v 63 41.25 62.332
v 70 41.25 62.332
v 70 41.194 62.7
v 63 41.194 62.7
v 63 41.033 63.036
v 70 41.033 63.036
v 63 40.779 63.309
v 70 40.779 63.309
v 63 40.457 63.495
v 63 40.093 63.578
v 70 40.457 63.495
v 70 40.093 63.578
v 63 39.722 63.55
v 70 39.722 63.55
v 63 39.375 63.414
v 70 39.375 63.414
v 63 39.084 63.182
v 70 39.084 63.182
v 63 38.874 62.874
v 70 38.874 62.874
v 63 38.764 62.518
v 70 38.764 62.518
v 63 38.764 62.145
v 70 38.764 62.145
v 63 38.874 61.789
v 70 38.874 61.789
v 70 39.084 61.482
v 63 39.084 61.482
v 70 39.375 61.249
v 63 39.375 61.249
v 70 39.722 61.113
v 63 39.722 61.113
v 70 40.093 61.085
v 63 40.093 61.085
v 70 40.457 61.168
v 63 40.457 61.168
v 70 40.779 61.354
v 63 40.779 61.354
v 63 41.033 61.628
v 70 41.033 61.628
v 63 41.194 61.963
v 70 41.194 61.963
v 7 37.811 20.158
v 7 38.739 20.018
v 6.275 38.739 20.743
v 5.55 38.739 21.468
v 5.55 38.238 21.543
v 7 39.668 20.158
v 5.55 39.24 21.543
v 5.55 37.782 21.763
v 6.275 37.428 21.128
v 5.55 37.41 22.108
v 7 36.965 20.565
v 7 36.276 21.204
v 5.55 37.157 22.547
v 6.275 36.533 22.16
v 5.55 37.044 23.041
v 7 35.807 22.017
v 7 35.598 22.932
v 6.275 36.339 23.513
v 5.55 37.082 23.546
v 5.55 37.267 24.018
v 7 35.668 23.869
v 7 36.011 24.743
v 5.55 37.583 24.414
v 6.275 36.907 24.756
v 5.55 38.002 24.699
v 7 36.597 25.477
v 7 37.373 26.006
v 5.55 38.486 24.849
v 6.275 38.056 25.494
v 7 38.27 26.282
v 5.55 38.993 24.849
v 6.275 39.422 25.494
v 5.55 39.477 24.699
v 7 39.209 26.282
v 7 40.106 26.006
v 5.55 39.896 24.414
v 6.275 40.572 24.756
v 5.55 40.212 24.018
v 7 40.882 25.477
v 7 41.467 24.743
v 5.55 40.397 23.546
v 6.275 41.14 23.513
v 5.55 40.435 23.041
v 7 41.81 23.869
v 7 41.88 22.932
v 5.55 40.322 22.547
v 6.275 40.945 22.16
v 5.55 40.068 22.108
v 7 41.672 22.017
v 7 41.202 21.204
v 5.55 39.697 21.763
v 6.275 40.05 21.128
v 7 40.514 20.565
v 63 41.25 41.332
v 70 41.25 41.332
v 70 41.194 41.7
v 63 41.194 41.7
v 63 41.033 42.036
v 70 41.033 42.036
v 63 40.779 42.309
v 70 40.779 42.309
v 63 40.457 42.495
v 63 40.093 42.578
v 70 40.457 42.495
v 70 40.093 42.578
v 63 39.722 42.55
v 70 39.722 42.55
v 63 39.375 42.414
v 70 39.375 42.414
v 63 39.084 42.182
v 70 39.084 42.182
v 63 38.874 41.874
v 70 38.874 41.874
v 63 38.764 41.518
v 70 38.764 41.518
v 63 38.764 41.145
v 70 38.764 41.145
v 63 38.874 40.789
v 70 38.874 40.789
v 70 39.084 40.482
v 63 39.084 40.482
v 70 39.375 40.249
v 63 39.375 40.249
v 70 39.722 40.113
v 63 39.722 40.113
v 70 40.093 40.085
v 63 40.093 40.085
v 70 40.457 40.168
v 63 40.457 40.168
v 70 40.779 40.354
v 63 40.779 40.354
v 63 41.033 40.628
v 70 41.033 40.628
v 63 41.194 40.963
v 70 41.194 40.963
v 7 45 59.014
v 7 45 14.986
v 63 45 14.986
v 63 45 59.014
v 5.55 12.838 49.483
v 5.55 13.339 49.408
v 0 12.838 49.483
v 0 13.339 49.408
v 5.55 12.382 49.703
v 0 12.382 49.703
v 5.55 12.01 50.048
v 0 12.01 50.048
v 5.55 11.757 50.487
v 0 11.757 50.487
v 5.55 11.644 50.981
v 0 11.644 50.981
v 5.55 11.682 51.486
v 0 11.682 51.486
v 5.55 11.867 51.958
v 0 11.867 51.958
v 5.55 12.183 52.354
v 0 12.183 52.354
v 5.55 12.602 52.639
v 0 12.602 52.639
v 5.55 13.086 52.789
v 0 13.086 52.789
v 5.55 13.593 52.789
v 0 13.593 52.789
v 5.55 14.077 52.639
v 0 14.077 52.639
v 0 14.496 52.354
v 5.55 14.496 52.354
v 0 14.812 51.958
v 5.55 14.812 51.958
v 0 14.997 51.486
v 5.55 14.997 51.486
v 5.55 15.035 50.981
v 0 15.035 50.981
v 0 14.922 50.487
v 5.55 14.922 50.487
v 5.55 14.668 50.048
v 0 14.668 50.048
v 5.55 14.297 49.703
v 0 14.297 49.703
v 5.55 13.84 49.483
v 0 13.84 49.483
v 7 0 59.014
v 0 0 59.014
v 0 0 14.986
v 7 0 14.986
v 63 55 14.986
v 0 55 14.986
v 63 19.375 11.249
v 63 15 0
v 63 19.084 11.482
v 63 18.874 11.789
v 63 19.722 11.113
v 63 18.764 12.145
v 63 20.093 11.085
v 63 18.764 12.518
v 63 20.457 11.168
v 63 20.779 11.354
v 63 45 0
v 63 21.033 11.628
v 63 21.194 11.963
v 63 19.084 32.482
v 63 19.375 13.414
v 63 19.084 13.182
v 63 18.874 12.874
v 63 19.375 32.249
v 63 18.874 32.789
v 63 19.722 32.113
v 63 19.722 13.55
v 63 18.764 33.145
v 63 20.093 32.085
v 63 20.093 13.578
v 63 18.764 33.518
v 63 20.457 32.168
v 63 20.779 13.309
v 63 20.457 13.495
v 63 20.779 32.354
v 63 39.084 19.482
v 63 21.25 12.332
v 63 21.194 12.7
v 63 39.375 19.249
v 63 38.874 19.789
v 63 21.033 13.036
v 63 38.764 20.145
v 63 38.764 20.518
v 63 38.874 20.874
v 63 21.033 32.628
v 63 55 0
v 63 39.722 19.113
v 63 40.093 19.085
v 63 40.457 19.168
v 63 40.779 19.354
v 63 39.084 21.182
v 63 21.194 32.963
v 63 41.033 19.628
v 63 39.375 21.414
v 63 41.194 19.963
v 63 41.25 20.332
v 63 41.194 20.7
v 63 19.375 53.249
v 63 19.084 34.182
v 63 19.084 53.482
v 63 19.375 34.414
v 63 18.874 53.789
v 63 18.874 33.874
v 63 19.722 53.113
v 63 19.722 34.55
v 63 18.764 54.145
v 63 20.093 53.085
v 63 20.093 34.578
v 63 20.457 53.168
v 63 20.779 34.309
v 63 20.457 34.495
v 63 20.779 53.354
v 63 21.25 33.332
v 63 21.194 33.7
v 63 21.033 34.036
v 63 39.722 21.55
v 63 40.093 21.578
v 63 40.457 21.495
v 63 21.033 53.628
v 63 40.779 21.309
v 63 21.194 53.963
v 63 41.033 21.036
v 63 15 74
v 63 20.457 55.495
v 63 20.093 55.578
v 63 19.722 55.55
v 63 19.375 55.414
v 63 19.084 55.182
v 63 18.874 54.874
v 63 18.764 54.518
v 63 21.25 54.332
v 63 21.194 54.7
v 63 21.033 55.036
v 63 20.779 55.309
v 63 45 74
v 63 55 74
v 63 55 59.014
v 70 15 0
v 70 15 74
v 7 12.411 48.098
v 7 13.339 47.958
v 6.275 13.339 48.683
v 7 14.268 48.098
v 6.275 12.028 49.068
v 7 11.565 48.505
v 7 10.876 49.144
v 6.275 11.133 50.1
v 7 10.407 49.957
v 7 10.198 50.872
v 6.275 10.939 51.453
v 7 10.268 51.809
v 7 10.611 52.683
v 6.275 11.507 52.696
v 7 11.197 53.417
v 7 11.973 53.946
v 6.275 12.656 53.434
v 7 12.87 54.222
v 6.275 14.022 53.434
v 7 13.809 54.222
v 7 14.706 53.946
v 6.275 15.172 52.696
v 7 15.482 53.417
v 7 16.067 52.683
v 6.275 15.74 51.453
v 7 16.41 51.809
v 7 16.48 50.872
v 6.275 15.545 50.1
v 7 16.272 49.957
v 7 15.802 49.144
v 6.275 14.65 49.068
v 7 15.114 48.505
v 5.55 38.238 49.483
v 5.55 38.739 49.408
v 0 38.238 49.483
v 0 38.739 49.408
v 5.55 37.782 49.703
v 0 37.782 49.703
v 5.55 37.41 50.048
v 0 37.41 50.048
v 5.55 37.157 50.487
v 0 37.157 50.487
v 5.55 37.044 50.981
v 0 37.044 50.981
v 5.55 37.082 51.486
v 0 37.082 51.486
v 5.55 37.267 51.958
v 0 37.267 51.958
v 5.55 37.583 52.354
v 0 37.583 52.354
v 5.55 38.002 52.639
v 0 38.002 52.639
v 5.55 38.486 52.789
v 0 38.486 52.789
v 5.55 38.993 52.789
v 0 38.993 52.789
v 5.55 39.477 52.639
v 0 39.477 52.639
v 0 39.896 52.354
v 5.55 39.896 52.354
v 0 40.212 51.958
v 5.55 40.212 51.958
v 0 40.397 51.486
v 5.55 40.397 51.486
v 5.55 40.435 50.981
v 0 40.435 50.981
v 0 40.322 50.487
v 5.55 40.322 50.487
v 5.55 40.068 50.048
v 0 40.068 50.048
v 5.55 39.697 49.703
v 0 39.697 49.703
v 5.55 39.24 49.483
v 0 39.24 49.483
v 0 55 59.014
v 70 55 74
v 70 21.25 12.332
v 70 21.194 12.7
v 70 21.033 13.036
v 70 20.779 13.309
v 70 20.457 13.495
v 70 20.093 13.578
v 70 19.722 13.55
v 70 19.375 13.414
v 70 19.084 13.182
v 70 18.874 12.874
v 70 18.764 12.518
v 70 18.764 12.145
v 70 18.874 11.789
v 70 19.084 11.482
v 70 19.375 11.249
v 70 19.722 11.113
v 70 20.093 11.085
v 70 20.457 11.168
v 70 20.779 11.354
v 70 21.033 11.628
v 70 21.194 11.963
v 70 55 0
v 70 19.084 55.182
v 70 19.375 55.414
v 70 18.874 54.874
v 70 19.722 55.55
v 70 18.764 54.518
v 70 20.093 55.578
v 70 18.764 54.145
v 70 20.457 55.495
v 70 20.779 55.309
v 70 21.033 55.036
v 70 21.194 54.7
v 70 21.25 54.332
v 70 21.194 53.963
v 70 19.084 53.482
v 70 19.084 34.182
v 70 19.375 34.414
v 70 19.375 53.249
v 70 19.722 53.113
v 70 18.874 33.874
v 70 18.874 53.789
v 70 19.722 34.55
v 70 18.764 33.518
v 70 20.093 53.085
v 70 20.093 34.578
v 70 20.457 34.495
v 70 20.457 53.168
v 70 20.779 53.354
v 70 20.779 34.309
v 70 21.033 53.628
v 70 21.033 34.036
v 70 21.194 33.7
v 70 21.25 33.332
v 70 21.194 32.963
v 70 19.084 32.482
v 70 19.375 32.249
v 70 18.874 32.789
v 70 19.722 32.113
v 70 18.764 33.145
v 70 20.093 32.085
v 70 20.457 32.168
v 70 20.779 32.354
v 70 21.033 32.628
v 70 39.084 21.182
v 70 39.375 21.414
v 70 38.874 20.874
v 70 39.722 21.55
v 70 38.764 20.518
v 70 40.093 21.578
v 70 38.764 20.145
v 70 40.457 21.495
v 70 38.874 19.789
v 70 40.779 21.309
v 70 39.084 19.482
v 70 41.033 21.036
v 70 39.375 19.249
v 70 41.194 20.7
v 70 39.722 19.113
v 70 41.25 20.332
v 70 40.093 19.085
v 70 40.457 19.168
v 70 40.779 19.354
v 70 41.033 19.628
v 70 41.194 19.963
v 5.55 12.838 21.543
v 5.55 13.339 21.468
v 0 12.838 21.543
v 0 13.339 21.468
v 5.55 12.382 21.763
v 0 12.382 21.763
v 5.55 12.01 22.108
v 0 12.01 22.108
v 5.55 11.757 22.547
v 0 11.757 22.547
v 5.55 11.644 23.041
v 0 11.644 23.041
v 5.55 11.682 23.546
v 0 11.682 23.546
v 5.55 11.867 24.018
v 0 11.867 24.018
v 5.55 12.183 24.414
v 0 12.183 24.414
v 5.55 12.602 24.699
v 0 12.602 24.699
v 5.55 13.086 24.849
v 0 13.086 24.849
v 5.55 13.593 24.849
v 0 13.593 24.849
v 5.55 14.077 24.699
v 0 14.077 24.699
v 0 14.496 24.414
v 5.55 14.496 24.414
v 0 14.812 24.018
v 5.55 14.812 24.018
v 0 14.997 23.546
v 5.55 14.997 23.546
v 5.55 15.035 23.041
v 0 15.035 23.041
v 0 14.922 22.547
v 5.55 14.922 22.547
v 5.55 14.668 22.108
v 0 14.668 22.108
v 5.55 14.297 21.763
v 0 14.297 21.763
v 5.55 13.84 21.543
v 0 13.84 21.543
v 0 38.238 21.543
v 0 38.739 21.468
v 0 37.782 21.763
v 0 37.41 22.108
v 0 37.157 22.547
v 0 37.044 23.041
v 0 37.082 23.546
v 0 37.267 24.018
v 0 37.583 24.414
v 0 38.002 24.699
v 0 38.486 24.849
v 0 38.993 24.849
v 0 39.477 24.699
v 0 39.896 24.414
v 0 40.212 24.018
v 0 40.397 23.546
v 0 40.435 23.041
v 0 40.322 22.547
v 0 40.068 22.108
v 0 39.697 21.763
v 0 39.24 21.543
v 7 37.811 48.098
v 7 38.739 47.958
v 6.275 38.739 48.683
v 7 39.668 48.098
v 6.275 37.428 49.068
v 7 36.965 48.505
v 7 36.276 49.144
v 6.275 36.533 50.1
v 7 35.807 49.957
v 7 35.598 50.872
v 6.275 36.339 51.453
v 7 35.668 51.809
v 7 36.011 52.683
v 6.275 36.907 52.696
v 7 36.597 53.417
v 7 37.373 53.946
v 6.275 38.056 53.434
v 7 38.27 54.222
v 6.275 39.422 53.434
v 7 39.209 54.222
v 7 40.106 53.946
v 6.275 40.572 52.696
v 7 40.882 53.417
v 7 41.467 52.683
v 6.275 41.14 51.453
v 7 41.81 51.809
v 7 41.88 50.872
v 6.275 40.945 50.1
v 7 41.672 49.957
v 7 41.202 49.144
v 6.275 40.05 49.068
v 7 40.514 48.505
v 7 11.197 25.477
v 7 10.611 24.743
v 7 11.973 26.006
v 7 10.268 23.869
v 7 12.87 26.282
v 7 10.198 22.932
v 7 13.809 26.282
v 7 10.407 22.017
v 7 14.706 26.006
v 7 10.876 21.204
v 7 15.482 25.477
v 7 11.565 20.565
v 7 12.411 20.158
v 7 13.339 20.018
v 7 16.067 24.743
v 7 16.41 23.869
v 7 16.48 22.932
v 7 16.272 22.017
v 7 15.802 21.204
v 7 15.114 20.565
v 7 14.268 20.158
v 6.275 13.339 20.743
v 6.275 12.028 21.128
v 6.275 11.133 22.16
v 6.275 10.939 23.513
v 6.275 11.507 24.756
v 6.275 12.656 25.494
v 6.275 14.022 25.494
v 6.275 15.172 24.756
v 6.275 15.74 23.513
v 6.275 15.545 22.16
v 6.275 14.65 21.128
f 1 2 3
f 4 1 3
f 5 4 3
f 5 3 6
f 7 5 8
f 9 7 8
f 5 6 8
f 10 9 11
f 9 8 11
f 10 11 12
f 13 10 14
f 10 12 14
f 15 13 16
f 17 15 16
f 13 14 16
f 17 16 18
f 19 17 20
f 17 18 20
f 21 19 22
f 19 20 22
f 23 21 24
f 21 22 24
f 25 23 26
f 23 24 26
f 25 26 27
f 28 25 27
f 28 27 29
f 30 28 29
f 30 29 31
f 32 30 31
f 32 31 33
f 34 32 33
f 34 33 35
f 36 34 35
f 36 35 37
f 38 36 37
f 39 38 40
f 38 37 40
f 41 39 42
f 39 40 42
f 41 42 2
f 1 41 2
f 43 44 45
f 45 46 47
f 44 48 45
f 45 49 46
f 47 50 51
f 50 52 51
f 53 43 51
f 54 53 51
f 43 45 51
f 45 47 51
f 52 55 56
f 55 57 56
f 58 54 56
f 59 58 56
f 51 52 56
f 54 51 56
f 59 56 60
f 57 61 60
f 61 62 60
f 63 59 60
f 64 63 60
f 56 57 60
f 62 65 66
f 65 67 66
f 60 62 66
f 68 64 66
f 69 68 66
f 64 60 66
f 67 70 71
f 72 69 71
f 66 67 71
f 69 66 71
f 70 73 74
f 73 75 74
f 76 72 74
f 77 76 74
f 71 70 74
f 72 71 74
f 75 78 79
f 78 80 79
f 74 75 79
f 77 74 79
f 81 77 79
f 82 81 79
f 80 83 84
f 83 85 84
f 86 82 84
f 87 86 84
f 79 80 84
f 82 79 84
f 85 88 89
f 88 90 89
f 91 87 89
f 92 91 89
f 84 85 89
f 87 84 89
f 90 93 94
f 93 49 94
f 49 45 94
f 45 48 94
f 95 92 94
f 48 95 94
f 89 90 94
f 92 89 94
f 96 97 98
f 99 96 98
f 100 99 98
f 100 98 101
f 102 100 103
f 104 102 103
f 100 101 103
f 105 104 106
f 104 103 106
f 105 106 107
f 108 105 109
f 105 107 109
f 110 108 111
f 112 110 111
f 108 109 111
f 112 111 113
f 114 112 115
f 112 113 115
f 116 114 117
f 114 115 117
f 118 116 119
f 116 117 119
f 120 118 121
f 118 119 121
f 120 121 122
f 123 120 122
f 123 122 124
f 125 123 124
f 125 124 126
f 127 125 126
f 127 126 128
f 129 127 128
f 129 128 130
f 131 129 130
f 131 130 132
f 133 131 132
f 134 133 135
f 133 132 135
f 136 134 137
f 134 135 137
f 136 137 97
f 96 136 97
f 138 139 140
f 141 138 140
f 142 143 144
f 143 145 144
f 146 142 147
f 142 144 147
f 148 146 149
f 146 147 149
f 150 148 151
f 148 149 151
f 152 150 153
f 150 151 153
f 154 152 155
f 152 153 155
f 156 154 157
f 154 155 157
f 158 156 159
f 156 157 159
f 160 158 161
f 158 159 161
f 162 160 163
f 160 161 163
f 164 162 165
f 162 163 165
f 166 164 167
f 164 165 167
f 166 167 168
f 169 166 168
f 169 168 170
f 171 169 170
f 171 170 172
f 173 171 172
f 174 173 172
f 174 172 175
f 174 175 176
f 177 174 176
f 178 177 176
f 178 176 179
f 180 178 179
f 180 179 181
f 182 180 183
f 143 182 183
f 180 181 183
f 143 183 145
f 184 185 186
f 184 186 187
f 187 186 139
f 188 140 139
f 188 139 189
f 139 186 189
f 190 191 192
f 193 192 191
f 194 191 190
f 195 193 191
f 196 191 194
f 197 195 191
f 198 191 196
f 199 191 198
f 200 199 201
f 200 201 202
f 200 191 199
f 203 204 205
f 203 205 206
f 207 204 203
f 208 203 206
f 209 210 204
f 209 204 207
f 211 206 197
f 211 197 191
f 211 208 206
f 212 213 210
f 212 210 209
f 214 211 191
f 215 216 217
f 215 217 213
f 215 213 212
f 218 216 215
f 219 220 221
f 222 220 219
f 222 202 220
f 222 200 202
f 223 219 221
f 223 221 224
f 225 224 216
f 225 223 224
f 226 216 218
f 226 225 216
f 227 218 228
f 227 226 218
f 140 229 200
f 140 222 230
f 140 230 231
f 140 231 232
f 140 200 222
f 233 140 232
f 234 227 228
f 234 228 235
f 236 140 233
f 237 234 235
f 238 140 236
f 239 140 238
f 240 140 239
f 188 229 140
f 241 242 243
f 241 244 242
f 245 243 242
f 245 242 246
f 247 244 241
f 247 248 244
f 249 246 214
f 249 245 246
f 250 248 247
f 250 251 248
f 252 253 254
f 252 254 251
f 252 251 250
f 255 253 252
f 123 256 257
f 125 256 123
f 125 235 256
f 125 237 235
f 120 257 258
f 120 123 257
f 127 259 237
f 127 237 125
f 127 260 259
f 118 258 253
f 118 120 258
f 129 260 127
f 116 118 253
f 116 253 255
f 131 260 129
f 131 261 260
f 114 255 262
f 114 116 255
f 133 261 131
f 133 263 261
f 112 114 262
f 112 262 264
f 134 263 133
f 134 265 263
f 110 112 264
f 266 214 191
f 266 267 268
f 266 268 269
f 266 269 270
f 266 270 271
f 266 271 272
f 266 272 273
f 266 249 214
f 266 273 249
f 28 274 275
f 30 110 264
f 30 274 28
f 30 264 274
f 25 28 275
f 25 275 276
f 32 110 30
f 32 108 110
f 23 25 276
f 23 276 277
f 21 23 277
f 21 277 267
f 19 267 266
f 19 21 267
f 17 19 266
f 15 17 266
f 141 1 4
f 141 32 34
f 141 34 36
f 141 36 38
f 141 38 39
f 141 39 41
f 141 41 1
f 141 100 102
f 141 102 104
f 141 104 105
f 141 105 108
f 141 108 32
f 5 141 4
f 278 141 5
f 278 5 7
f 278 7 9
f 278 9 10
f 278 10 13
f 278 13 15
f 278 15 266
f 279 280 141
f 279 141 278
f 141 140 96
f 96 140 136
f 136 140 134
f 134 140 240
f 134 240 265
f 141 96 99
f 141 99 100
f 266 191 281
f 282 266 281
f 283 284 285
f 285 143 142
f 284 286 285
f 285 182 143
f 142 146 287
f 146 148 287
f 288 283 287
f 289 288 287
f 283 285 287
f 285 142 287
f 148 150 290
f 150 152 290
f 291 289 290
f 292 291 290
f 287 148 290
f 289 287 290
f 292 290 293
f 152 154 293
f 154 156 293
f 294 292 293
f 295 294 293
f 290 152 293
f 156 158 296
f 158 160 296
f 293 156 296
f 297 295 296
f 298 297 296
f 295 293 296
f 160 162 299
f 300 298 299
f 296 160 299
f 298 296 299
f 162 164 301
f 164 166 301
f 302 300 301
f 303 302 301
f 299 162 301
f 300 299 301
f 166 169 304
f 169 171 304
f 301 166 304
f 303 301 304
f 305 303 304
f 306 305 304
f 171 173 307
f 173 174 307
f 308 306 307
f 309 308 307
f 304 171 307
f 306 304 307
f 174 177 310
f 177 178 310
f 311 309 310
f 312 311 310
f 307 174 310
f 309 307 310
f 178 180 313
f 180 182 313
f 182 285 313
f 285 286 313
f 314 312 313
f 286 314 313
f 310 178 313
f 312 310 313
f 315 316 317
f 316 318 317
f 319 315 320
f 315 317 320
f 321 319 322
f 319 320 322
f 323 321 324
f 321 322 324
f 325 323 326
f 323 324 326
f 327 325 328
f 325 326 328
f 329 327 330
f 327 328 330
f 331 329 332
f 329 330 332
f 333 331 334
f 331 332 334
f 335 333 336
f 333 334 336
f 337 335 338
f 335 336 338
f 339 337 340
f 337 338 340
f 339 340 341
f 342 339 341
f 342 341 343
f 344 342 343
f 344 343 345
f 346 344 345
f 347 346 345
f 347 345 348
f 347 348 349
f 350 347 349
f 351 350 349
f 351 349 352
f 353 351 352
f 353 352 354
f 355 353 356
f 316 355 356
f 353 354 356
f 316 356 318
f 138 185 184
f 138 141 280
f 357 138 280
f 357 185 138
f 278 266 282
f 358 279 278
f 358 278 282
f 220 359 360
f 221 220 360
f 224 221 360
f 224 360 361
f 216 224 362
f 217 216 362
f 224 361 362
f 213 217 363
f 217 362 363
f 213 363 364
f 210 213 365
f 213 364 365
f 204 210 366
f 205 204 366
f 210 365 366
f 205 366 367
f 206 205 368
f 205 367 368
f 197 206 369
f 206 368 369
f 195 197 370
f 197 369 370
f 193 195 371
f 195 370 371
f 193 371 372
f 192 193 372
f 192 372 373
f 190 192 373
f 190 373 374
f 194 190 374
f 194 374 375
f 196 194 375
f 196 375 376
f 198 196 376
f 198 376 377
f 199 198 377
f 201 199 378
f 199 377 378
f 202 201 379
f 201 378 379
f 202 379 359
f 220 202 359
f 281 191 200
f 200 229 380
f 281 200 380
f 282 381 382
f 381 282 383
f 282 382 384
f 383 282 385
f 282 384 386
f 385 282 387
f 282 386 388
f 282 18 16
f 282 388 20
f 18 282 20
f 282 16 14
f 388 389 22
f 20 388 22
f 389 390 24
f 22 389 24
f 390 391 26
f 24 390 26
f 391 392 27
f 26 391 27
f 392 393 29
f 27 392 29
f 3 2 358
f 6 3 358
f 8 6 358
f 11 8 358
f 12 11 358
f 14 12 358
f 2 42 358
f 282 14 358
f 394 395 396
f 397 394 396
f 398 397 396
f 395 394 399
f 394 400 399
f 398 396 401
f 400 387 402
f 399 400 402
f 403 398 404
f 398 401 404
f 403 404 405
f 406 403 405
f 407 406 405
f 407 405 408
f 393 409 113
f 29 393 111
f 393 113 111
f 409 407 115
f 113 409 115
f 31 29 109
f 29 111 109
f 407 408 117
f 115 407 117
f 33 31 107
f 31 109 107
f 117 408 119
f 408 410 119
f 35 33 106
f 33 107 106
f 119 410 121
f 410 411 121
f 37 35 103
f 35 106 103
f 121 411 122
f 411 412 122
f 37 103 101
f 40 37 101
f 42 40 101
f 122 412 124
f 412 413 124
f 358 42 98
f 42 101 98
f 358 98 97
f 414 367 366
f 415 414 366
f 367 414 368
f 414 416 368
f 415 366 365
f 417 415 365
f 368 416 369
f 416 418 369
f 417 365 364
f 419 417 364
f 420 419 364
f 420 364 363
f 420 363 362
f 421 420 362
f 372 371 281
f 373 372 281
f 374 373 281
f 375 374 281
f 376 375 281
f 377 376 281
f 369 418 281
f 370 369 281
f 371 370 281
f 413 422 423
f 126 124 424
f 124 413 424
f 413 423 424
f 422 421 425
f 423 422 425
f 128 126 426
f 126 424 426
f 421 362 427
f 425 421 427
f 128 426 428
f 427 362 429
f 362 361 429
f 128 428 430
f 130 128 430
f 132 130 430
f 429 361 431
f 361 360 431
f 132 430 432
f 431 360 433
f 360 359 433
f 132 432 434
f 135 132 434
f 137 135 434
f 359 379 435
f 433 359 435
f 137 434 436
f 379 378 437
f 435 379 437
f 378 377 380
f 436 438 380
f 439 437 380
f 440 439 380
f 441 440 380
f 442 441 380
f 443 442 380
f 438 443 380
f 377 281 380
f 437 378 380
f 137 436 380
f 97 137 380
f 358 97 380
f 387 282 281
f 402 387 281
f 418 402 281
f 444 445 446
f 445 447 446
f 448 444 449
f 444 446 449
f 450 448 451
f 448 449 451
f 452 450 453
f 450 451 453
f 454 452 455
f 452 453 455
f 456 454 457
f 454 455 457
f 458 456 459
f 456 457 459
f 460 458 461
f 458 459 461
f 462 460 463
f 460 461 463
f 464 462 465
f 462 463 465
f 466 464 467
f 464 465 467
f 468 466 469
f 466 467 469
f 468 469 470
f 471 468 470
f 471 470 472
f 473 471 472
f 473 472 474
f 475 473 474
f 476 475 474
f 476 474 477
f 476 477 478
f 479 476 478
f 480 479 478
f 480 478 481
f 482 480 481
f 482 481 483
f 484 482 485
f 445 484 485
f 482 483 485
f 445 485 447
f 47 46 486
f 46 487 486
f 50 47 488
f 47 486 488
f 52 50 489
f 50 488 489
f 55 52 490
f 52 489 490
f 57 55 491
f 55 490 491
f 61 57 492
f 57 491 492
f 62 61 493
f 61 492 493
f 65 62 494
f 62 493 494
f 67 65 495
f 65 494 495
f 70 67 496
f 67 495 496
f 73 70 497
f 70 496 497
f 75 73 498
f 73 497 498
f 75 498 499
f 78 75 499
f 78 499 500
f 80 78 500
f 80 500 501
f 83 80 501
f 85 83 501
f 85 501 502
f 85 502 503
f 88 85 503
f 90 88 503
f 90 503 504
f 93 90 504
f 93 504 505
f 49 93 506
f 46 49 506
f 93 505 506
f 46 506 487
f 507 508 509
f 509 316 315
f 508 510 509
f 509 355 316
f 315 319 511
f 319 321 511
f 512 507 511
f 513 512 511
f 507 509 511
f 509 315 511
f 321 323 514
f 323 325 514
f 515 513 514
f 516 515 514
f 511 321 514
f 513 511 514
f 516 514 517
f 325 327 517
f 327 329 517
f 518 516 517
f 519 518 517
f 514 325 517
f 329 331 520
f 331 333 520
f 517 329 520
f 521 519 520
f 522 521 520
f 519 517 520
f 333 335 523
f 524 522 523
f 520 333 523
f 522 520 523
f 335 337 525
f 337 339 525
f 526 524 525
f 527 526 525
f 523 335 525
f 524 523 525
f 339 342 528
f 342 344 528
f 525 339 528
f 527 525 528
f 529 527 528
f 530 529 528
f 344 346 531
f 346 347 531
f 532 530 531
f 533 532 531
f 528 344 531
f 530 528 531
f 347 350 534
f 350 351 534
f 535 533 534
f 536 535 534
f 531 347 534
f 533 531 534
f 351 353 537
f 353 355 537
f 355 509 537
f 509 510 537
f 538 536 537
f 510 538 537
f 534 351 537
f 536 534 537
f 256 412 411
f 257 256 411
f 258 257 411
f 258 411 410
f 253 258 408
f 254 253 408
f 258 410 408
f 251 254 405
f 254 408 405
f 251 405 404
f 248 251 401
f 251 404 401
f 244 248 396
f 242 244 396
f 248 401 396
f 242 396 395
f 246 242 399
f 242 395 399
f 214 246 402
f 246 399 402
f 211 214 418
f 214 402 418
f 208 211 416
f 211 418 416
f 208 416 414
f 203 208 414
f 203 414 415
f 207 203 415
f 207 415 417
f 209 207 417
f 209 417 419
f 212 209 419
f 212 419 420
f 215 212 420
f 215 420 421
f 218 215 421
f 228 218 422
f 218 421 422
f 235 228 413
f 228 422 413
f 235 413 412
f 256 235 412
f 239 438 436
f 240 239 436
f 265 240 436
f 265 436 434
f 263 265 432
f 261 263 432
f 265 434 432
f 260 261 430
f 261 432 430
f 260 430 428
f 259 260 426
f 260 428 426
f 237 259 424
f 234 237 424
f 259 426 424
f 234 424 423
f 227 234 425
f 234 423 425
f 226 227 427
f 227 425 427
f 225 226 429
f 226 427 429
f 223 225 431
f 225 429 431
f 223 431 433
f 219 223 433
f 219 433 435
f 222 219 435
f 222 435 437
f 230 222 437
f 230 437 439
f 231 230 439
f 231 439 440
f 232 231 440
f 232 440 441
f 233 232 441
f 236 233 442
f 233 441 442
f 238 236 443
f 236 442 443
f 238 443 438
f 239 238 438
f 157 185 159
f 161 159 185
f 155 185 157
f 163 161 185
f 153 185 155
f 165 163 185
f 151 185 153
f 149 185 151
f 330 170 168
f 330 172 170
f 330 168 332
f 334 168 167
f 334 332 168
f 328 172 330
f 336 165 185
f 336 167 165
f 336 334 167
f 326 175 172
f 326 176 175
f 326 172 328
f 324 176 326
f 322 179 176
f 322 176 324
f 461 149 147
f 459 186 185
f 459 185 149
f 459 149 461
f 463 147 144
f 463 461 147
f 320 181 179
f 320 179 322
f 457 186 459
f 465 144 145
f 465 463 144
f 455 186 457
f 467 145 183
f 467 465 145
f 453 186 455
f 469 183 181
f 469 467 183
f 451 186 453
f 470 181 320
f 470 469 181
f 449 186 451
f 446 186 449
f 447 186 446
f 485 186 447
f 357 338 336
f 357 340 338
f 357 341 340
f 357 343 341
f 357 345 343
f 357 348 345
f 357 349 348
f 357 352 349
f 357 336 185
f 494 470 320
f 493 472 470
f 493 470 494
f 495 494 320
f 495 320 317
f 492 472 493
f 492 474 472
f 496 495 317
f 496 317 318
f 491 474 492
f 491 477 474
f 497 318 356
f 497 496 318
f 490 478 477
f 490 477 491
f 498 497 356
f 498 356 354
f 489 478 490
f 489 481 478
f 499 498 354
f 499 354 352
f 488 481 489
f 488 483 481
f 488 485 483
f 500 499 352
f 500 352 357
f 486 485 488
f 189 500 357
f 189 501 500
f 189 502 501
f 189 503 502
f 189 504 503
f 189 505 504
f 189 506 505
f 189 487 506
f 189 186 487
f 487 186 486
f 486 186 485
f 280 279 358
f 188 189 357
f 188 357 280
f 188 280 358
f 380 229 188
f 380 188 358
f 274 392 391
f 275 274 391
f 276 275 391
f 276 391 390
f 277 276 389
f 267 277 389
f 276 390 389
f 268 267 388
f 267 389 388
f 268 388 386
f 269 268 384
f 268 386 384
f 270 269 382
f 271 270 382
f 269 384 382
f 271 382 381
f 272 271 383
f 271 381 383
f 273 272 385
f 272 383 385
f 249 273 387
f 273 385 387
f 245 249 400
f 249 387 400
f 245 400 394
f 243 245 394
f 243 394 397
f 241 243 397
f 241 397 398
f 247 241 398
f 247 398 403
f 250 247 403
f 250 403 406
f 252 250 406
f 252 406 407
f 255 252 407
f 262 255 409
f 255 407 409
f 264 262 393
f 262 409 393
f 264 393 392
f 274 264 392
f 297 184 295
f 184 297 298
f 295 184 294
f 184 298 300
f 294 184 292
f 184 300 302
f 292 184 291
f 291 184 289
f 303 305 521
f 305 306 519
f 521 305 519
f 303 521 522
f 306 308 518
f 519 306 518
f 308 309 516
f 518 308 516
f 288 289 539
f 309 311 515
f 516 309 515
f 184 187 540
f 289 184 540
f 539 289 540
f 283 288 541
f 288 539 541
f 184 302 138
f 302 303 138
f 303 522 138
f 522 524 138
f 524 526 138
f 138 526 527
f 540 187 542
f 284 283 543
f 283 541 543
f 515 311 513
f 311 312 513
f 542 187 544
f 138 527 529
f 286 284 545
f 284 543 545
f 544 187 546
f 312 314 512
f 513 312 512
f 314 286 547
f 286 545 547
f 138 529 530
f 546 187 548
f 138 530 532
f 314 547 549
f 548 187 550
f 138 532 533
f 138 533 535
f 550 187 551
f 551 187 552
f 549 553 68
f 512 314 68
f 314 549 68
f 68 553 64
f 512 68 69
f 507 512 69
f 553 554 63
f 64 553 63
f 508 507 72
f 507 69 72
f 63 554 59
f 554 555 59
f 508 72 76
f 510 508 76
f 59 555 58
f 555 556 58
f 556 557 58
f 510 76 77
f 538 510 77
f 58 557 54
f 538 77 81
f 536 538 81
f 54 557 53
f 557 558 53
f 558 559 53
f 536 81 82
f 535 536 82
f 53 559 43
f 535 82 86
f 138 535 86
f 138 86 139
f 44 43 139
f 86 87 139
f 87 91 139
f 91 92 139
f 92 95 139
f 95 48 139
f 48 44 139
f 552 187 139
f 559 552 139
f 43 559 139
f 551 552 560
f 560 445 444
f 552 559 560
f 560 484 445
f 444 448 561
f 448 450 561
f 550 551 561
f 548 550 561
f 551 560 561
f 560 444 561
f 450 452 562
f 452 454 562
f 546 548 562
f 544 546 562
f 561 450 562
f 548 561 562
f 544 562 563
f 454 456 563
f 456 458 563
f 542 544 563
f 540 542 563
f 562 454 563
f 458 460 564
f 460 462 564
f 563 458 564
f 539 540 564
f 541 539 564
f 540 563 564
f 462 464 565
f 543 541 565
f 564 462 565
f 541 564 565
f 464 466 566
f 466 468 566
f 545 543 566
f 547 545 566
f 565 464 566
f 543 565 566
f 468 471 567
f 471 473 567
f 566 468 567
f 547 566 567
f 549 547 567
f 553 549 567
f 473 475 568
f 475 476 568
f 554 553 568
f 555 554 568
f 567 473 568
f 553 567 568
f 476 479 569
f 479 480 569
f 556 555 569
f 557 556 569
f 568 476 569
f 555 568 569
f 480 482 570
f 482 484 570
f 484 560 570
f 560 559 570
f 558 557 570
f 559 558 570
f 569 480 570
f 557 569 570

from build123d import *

# Parameters (mm, degrees)
SKETCH1_W                                           = 70
SKETCH1_H                                           = 55
BOSS_EXTRUDE1_DEPTH                                 = 74
CUT_EXTRUDE1_DEPTH                                  = 116.762688289
CUT_EXTRUDE1_DEPTH_BACK                             = 116.762688289
SKETCH4_R                                           = 1.25
CUT_EXTRUDE4_DEPTH                                  = 7
SKETCH5_W                                           = 14.985710671
SKETCH5_H                                           = 55
CUT_EXTRUDE5_DEPTH                                  = 63
CSK_FOR_M3_COUNTERSUNK_FLAT_HEAD_SCREW1_D           = 3.4
CSK_FOR_M3_COUNTERSUNK_FLAT_HEAD_SCREW1_DEPTH       = 10
CSK_FOR_M3_COUNTERSUNK_FLAT_HEAD_SCREW1_CSINK_D     = 6.3
CSK_FOR_M3_COUNTERSUNK_FLAT_HEAD_SCREW1_CSINK_ANGLE = 90
CSK_FOR_M3_COUNTERSUNK_FLAT_HEAD_SCREW1_TIP         = 1.021463052


with BuildPart() as part:
    # Sketch1 → Boss-Extrude1 (new body)
    with BuildSketch(Plane.XY):
        with Locations((35, 27.5)):
            Rectangle(SKETCH1_W, SKETCH1_H)
    extrude(amount=BOSS_EXTRUDE1_DEPTH)

    # Sketch2 → Cut-Extrude1 (cut, two sides: drawn at the far end of the back side and taken through both)
    with BuildSketch(Plane.XY.offset(74).offset(-CUT_EXTRUDE1_DEPTH_BACK)):
        Polygon((7, 0), (7, 45), (63, 45), (63, 15), (70, 15), (70, 0), (60, 0), align=None)
    extrude(amount=CUT_EXTRUDE1_DEPTH + CUT_EXTRUDE1_DEPTH_BACK, mode=Mode.SUBTRACT)

    # Sketch4 → Cut-Extrude4 (cut)
    with BuildSketch(Plane(origin=(70, 0, 0), x_dir=(0, 0, -1), z_dir=(1, 0, 0))):
        with Locations((-83.331764561, 40)):
            Circle(SKETCH4_R)
        with Locations((-75.331764561, 20)):
            Circle(SKETCH4_R)
        with Locations(Location((-62.331764561, 40, 0), (0, 0, 90))):
            Circle(SKETCH4_R)
        with Locations(Location((-54.331764561, 20, 0), (0, 0, 90))):
            Circle(SKETCH4_R)
        with Locations(Location((-41.331764561, 40, 0), (0, 0, 90))):
            Circle(SKETCH4_R)
        with Locations(Location((-33.331764561, 20, 0), (0, 0, 90))):
            Circle(SKETCH4_R)
        with Locations(Location((-20.331764561, 40, 0), (0, 0, 90))):
            Circle(SKETCH4_R)
        with Locations(Location((-12.331764561, 20, 0), (0, 0, 90))):
            Circle(SKETCH4_R)
    extrude(amount=-CUT_EXTRUDE4_DEPTH, mode=Mode.SUBTRACT)

    # Sketch5 → Cut-Extrude5 (cut)
    with BuildSketch(Plane.ZY):
        with Locations((7.492855336, 27.5)):
            Rectangle(SKETCH5_W, SKETCH5_H)
        with Locations((66.507144665, 27.5)):
            Rectangle(SKETCH5_W, SKETCH5_H)
    extrude(amount=-CUT_EXTRUDE5_DEPTH, mode=Mode.SUBTRACT)

    # CSK for M3 Countersunk Flat Head Screw1
    with Locations(Plane(origin=(7, 0, 0), x_dir=(0, 0, 1), z_dir=(1, 0, 0))):
        with Locations((23.167654473, -38.739261213), (23.167654473, -13.339261213), (51.107654473, -13.339261213), (51.107654473, -38.739261213)):
            CounterSinkHole(CSK_FOR_M3_COUNTERSUNK_FLAT_HEAD_SCREW1_D / 2, CSK_FOR_M3_COUNTERSUNK_FLAT_HEAD_SCREW1_CSINK_D / 2, depth=CSK_FOR_M3_COUNTERSUNK_FLAT_HEAD_SCREW1_DEPTH, counter_sink_angle=CSK_FOR_M3_COUNTERSUNK_FLAT_HEAD_SCREW1_CSINK_ANGLE)
            with Locations((0, 0, -(CSK_FOR_M3_COUNTERSUNK_FLAT_HEAD_SCREW1_DEPTH + CSK_FOR_M3_COUNTERSUNK_FLAT_HEAD_SCREW1_TIP / 2))):  # 118° drill point
                Cone(0, CSK_FOR_M3_COUNTERSUNK_FLAT_HEAD_SCREW1_D / 2, CSK_FOR_M3_COUNTERSUNK_FLAT_HEAD_SCREW1_TIP, mode=Mode.SUBTRACT)


solid = part.part
